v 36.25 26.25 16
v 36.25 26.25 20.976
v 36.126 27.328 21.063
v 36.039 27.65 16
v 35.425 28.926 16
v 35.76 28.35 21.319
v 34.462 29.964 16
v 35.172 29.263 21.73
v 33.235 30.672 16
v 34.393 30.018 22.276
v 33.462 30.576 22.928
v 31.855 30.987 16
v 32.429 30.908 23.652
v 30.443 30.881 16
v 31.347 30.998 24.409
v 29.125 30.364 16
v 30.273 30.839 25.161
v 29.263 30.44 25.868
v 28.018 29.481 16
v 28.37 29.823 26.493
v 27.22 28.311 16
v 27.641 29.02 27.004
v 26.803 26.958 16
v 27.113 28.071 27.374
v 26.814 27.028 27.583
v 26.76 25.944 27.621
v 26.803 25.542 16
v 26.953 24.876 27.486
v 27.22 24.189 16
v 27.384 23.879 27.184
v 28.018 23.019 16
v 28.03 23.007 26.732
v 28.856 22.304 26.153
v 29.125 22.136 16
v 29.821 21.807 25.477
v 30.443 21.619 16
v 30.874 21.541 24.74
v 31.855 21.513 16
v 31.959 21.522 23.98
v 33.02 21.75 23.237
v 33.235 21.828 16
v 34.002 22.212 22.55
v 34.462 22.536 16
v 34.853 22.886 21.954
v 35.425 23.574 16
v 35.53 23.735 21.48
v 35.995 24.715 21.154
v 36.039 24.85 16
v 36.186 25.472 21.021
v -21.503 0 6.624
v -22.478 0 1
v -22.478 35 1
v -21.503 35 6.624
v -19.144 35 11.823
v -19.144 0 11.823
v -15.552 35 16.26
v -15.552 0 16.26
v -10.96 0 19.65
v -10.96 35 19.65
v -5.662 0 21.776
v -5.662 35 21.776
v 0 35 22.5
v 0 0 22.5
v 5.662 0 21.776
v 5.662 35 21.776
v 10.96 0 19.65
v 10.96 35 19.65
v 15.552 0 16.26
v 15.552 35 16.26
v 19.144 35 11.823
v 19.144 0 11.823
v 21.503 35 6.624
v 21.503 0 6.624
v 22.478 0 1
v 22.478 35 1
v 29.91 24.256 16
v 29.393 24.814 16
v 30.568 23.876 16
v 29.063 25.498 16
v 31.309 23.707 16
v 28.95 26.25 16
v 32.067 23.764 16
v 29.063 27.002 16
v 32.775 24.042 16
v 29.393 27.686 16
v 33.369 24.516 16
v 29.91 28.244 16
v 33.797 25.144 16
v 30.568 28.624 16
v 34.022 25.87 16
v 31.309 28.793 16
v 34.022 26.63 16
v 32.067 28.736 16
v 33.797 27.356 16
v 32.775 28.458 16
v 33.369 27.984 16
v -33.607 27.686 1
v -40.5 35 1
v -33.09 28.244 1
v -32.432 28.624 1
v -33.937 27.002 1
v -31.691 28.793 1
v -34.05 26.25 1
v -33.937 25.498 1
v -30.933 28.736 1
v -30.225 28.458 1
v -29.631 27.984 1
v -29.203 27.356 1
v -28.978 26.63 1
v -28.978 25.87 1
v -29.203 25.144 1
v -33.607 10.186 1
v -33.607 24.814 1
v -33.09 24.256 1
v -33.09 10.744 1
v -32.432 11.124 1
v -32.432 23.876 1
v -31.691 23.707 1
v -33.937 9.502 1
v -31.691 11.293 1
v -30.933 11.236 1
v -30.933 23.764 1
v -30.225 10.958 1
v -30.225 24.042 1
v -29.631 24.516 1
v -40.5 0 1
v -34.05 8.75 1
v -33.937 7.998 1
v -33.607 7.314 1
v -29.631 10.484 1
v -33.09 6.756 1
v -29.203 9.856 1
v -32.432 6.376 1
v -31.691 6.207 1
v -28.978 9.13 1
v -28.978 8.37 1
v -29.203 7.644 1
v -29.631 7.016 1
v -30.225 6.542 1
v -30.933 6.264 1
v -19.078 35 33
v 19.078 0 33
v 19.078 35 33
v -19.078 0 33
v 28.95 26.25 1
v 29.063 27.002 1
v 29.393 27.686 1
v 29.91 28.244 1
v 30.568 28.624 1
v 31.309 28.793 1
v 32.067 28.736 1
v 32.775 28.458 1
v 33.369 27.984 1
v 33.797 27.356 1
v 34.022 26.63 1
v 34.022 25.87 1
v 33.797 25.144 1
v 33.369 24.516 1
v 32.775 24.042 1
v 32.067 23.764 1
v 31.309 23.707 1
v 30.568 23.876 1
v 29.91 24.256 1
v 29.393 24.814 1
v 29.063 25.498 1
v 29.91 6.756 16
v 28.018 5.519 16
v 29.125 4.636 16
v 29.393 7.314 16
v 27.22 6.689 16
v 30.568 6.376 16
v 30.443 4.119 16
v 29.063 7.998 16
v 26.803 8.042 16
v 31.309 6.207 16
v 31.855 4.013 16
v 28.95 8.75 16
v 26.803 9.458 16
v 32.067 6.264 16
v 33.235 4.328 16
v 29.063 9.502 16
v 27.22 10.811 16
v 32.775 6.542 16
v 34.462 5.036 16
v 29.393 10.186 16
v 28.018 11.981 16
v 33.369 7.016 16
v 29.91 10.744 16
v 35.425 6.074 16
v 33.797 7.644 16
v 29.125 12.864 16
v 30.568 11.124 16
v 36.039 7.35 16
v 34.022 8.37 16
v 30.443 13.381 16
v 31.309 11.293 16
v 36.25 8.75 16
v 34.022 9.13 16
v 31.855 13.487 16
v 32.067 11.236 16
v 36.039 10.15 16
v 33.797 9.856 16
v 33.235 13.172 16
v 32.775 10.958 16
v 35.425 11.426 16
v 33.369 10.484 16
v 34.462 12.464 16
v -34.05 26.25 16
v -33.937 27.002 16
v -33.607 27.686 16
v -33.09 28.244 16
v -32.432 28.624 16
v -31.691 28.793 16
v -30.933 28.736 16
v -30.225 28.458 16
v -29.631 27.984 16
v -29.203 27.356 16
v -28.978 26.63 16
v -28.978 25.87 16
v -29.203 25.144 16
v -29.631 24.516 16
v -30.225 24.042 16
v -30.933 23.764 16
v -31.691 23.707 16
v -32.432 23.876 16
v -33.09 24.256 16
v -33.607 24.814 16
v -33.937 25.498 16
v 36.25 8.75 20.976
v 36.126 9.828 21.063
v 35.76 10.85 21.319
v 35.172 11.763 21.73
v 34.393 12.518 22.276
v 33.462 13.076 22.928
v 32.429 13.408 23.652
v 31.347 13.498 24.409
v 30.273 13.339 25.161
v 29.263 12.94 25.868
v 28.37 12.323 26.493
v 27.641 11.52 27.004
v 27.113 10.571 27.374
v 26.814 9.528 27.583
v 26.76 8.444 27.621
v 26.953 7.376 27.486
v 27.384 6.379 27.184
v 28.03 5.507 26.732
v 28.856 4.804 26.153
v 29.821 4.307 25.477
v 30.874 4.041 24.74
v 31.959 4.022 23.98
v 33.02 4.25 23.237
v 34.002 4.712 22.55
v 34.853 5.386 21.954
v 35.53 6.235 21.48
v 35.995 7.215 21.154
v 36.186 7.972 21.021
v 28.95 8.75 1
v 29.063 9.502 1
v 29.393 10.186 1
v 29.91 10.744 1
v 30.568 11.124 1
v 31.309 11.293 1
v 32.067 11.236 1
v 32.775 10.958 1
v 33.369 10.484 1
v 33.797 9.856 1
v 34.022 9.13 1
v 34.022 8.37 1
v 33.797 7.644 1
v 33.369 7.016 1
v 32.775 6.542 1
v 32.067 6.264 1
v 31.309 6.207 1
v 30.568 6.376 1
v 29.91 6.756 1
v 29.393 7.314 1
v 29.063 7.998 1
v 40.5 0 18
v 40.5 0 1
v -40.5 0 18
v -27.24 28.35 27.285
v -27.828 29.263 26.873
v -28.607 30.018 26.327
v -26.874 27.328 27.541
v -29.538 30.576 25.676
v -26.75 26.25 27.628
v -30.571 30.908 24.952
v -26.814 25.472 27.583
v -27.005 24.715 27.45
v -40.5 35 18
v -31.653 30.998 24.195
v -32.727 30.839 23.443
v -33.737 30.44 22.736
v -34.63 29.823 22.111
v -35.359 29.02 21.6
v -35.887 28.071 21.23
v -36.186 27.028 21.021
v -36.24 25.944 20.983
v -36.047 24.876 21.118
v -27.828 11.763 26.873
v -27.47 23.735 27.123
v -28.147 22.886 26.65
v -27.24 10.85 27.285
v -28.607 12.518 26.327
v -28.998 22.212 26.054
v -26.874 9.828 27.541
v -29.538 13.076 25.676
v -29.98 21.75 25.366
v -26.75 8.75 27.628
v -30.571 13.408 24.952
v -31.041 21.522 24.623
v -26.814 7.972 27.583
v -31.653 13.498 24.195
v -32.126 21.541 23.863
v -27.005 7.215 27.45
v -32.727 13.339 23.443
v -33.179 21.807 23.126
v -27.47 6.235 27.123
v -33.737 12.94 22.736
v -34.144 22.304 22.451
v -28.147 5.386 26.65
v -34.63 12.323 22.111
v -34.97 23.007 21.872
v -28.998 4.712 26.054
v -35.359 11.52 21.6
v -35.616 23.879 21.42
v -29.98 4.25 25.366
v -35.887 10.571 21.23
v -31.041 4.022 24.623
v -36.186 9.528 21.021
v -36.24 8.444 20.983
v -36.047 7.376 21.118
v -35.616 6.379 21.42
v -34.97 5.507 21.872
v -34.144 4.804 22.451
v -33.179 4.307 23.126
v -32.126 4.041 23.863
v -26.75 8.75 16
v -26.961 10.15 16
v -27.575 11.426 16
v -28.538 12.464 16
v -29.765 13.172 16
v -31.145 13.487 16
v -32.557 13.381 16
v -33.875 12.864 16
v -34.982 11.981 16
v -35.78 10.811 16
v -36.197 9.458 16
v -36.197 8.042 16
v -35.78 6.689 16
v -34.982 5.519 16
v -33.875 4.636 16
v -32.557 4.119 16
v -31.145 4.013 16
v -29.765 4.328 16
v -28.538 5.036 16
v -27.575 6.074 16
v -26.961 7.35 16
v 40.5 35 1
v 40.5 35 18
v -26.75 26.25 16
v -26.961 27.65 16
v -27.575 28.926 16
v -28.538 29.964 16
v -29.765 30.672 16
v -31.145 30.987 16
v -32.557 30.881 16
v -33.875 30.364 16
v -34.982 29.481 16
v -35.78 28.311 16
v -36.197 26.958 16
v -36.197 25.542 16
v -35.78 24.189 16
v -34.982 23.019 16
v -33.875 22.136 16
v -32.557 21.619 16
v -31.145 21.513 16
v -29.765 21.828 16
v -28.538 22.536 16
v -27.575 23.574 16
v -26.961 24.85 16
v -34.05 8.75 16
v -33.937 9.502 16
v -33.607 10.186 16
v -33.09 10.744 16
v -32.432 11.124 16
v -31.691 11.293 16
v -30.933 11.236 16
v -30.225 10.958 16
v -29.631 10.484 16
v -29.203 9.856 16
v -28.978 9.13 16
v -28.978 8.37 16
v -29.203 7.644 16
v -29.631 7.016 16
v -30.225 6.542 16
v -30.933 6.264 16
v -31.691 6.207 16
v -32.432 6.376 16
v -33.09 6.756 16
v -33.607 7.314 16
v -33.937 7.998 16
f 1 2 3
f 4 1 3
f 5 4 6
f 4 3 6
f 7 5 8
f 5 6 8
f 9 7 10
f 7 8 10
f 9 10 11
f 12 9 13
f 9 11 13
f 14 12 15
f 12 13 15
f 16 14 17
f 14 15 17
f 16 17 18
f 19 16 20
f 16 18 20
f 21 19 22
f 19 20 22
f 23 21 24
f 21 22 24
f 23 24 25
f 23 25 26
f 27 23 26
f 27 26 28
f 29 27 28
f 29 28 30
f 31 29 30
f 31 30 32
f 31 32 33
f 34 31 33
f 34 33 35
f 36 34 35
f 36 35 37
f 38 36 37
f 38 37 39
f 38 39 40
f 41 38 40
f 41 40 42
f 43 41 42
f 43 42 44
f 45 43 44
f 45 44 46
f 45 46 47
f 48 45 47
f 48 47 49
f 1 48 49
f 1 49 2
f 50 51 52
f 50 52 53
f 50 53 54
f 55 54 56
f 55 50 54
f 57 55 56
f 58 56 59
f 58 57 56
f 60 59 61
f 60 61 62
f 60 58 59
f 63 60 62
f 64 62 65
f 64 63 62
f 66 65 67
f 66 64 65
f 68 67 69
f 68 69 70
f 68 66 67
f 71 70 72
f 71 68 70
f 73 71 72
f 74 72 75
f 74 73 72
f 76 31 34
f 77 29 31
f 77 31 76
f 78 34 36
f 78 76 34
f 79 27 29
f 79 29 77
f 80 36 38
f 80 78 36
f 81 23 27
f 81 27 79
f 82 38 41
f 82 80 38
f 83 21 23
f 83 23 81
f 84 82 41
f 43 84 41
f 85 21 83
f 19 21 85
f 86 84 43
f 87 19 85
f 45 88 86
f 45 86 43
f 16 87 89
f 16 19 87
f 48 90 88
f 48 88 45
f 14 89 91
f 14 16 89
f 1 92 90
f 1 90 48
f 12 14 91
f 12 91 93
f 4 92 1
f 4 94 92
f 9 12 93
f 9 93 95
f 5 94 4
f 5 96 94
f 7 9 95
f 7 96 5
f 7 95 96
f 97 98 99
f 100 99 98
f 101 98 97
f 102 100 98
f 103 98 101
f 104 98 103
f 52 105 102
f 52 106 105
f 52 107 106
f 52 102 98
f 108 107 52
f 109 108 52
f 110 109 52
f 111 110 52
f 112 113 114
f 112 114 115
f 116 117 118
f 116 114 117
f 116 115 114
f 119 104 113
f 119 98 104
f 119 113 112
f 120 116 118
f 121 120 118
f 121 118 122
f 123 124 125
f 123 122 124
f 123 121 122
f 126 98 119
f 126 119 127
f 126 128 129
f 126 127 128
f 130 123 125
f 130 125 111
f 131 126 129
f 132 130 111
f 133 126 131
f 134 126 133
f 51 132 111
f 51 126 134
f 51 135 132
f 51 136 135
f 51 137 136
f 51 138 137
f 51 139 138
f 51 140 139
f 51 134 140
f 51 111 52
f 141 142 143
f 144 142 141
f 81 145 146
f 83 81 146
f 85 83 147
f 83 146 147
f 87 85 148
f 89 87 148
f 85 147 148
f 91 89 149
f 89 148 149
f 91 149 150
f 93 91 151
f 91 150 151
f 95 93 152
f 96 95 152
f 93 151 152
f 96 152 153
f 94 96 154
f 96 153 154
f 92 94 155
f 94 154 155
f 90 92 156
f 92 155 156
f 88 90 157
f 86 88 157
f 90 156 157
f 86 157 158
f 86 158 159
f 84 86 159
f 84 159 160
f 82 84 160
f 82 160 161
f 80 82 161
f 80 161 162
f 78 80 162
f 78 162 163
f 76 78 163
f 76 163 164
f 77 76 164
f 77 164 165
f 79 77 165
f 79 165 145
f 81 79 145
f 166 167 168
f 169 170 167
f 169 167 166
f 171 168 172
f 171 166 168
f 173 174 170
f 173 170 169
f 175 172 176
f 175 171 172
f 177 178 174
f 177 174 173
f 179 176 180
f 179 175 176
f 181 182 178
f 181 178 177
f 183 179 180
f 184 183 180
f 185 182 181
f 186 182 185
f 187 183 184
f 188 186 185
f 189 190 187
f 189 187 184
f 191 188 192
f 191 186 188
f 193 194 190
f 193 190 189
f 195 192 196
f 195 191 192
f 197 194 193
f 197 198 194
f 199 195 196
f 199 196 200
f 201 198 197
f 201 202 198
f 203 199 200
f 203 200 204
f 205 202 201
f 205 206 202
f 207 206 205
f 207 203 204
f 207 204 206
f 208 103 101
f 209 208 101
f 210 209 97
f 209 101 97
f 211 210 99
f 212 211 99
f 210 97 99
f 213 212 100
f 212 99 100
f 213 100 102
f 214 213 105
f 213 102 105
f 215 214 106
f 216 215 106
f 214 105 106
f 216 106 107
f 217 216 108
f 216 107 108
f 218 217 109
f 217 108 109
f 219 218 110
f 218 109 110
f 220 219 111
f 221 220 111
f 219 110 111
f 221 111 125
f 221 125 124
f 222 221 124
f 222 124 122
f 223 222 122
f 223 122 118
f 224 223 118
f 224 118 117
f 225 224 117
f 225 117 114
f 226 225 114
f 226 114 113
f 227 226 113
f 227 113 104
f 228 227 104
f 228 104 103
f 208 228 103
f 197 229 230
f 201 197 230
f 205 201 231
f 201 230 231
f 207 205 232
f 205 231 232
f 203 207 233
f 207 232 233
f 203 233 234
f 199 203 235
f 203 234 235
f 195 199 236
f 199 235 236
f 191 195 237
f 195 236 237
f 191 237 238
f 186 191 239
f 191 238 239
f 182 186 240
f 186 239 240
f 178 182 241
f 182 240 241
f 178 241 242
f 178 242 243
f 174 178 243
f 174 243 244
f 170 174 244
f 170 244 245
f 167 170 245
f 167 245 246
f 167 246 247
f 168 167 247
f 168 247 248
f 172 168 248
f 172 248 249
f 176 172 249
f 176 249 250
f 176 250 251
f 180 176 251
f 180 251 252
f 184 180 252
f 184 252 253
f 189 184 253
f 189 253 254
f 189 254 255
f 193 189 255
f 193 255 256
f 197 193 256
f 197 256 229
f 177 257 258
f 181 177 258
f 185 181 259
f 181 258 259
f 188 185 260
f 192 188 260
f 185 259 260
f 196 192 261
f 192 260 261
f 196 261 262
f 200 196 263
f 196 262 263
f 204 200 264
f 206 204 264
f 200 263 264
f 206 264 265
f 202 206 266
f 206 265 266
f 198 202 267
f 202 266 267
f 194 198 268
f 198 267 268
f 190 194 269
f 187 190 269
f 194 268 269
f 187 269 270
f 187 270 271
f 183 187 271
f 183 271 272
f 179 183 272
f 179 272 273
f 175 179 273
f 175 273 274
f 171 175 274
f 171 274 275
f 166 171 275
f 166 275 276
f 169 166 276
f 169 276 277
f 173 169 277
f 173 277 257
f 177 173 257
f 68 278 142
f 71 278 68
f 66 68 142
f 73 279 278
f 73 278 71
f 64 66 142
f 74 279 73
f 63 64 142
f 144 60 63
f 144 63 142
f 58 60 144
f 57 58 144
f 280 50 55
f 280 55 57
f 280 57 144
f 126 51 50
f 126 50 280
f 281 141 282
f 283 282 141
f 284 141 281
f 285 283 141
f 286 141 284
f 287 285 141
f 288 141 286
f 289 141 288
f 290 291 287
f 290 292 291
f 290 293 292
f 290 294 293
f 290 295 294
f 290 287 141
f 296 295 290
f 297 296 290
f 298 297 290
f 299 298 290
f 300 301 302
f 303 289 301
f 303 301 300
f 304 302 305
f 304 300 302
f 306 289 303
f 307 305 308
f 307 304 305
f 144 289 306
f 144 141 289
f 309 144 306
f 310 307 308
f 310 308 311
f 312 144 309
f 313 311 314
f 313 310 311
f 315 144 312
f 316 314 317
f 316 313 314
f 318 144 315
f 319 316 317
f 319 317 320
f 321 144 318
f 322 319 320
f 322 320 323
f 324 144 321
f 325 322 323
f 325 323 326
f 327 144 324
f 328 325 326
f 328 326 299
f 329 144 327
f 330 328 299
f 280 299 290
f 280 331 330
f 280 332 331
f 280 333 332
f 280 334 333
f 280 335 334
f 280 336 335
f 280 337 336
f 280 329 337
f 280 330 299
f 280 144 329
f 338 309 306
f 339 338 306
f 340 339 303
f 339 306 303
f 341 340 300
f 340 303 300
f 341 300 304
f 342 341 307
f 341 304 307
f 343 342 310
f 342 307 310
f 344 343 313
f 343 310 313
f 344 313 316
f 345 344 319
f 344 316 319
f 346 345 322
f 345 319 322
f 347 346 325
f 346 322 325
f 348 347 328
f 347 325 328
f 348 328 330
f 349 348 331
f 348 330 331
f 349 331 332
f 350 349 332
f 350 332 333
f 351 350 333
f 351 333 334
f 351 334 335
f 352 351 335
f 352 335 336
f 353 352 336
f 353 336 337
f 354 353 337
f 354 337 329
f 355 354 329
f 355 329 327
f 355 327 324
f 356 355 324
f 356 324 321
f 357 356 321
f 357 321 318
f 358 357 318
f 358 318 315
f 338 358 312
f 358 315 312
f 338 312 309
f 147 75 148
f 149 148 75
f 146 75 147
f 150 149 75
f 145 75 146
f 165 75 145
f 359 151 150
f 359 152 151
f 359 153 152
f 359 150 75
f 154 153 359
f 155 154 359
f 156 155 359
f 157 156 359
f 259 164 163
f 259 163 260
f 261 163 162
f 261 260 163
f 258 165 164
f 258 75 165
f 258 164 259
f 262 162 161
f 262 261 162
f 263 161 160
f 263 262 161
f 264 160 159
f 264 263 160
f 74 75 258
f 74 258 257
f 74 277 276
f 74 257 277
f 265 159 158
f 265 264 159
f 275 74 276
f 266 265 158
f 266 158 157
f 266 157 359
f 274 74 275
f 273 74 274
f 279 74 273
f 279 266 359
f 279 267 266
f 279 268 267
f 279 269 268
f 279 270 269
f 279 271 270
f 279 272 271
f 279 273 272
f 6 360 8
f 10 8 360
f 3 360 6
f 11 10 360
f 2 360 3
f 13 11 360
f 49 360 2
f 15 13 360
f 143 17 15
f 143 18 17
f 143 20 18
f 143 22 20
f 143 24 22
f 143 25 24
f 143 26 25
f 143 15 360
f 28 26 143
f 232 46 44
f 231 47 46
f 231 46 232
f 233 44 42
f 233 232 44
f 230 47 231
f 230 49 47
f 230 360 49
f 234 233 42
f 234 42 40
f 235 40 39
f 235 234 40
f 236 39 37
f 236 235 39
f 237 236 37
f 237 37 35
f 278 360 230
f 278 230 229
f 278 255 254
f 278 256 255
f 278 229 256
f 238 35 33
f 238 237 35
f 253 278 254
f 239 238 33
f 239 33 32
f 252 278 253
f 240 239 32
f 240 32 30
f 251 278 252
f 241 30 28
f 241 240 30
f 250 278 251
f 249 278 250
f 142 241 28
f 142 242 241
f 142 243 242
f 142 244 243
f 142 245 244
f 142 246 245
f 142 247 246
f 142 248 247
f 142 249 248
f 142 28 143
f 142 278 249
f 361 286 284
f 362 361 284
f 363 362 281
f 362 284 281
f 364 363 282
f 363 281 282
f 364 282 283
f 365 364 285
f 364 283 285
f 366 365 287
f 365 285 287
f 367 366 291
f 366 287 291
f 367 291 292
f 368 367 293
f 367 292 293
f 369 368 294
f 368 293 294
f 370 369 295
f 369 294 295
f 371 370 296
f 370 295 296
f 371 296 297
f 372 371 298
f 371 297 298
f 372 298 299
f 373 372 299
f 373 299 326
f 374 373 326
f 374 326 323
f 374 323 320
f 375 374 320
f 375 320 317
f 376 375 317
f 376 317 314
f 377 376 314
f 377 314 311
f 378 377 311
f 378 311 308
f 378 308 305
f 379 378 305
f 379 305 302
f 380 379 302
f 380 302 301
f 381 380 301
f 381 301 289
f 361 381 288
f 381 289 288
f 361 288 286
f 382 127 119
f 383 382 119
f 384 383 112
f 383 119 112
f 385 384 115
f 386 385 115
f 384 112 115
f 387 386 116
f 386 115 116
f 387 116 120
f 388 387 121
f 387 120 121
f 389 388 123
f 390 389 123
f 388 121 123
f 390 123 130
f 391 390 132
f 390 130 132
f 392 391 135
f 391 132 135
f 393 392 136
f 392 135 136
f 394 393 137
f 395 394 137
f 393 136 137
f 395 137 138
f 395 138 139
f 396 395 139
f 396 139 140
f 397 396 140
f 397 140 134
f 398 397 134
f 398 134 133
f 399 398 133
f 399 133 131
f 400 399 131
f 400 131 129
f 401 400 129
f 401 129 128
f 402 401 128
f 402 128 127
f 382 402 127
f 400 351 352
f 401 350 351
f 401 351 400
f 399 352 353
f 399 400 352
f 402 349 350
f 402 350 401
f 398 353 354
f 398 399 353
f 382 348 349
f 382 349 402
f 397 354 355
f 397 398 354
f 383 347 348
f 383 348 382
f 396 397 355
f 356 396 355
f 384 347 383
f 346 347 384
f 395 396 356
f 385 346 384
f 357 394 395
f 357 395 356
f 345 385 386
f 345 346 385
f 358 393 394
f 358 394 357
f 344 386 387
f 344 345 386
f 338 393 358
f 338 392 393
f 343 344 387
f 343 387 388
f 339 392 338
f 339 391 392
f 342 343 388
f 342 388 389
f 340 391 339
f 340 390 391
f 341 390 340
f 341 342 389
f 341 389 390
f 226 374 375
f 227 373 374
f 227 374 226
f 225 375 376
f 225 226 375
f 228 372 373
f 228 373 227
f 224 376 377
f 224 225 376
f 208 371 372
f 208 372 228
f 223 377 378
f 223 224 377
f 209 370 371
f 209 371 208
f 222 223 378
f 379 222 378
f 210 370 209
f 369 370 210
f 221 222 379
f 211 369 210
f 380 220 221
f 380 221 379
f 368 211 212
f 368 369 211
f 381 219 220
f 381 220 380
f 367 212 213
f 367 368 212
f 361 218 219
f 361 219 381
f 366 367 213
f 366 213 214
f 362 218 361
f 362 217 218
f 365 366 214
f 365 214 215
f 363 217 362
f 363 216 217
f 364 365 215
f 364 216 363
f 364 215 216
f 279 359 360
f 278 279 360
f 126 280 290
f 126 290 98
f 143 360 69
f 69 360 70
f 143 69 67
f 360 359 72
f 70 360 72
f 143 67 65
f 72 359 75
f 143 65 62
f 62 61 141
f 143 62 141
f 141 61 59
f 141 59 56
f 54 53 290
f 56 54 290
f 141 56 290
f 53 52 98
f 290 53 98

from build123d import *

# Parameters (mm, degrees)
SALIENTE_EXTRUIR1_DEPTH = 35
CORTAR_EXTRUIR1_REACH   = 64.883
CROQUIS2_R              = 2.55
CROQUIS3_R              = 4.75
CORTAR_EXTRUIR2_DEPTH   = 17
CHAFL_N1_SIZE           = 15
CHAFL_N1_SIZE_2         = 21.422220101
CORTAR_EXTRUIR3_START   = -35
CROQUIS4_W              = 81
CROQUIS4_H              = 1
CORTAR_EXTRUIR3_DEPTH   = 35


with BuildPart() as part:
    # Croquis1 → Saliente-Extruir1 (new body)
    with BuildSketch(Plane(origin=(0, 0, 0), x_dir=(1, 0, 0), z_dir=(0, 1, 0))):
        with BuildLine():
            Line((22.5, 0), (40.5, 0))
            Line((40.5, 0), (40.5, -33))
            Line((40.5, -33), (-40.5, -33))
            Line((-40.5, -33), (-40.5, 0))
            Line((-40.5, 0), (-22.5, 0))
            ThreePointArc((-22.5, 0), (0, -22.5), (22.5, 0))
        make_face()
    extrude(amount=SALIENTE_EXTRUIR1_DEPTH)

    # Croquis2 → Cortar-Extruir1 (cut, up to next)
    with BuildSketch(Plane(origin=(0, 0, 0), x_dir=(-1, 0, 0), z_dir=(0, 0, -1)), mode=Mode.PRIVATE) as cortar_extruir1_sk1:
        with Locations((-31.5, 26.25)):
            Circle(CROQUIS2_R)
    cortar_extruir1_tool1 = extrude(cortar_extruir1_sk1.sketch, amount=-CORTAR_EXTRUIR1_REACH, mode=Mode.PRIVATE) & part.part
    # Croquis2 → Cortar-Extruir1 (cut, up to next)
    with BuildSketch(Plane(origin=(0, 0, 0), x_dir=(-1, 0, 0), z_dir=(0, 0, -1)), mode=Mode.PRIVATE) as cortar_extruir1_sk2:
        with Locations((-31.5, 8.75)):
            Circle(CROQUIS2_R)
    cortar_extruir1_tool2 = extrude(cortar_extruir1_sk2.sketch, amount=-CORTAR_EXTRUIR1_REACH, mode=Mode.PRIVATE) & part.part
    # Croquis2 → Cortar-Extruir1 (cut, up to next)
    with BuildSketch(Plane(origin=(0, 0, 0), x_dir=(-1, 0, 0), z_dir=(0, 0, -1)), mode=Mode.PRIVATE) as cortar_extruir1_sk3:
        with Locations((31.5, 8.75)):
            Circle(CROQUIS2_R)
    cortar_extruir1_tool3 = extrude(cortar_extruir1_sk3.sketch, amount=-CORTAR_EXTRUIR1_REACH, mode=Mode.PRIVATE) & part.part
    # Croquis2 → Cortar-Extruir1 (cut, up to next)
    with BuildSketch(Plane(origin=(0, 0, 0), x_dir=(-1, 0, 0), z_dir=(0, 0, -1)), mode=Mode.PRIVATE) as cortar_extruir1_sk4:
        with Locations((31.5, 26.25)):
            Circle(CROQUIS2_R)
    cortar_extruir1_tool4 = extrude(cortar_extruir1_sk4.sketch, amount=-CORTAR_EXTRUIR1_REACH, mode=Mode.PRIVATE) & part.part
    add(cortar_extruir1_tool1.solids().sort_by_distance((31.5, 26.25, 0))[0], mode=Mode.SUBTRACT)
    add(cortar_extruir1_tool2.solids().sort_by_distance((31.5, 8.75, 0))[0], mode=Mode.SUBTRACT)
    add(cortar_extruir1_tool3.solids().sort_by_distance((-31.5, 8.75, 0))[0], mode=Mode.SUBTRACT)
    add(cortar_extruir1_tool4.solids().sort_by_distance((-31.5, 26.25, 0))[0], mode=Mode.SUBTRACT)

    # Croquis3 → Cortar-Extruir2 (cut)
    with BuildSketch(Plane.XY.offset(33)):
        with Locations((-31.5, 26.25)):
            Circle(CROQUIS3_R)
        with Locations((-31.5, 8.75)):
            Circle(CROQUIS3_R)
        with Locations((31.5, 26.25)):
            Circle(CROQUIS3_R)
        with Locations((31.5, 8.75)):
            Circle(CROQUIS3_R)
    extrude(amount=-CORTAR_EXTRUIR2_DEPTH, mode=Mode.SUBTRACT)

    # Chaflán1
    # the kernel refuses this chamfer: 21.422220101, 15 mm, written as the material it takes off along each edge
    with BuildSketch(Plane(origin=(40.5, -55.3240023, 33), x_dir=(0.045263737714021264, 0, -0.9989750717851553), z_dir=(0, 1, 0))) as chafl_n1_piece_1:
        Polygon((CHAFL_N1_SIZE * 0.998975071785, CHAFL_N1_SIZE * 0.045263737714), (-CHAFL_N1_SIZE_2 * 0.0452637377143, CHAFL_N1_SIZE_2 * 0.998975071791), (0, 0), align=None)
    extrude(amount=145.6480046, mode=Mode.SUBTRACT)
    with BuildSketch(Plane(origin=(-40.5, -55.3240023, 33), x_dir=(0.9997533347641299, 0, 0.022209674198456895), z_dir=(0, 1, 0))) as chafl_n1_piece_2:
        Polygon((CHAFL_N1_SIZE_2 * 0.99975333477, CHAFL_N1_SIZE_2 * 0.0222096741986), (-CHAFL_N1_SIZE * 0.0222096741985, CHAFL_N1_SIZE * 0.999753334764), (0, 0), align=None)
    extrude(amount=145.6480046, mode=Mode.SUBTRACT)

    # Croquis4 → Cortar-Extruir3 (cut)
    with BuildSketch(Plane(origin=(0, 35, 0), x_dir=(1, 0, 0), z_dir=(0, 1, 0)).offset(CORTAR_EXTRUIR3_START)):
        with Locations((0, -0.5)):
            Rectangle(CROQUIS4_W, CROQUIS4_H)
    extrude(amount=CORTAR_EXTRUIR3_DEPTH, mode=Mode.SUBTRACT)


solid = part.part
